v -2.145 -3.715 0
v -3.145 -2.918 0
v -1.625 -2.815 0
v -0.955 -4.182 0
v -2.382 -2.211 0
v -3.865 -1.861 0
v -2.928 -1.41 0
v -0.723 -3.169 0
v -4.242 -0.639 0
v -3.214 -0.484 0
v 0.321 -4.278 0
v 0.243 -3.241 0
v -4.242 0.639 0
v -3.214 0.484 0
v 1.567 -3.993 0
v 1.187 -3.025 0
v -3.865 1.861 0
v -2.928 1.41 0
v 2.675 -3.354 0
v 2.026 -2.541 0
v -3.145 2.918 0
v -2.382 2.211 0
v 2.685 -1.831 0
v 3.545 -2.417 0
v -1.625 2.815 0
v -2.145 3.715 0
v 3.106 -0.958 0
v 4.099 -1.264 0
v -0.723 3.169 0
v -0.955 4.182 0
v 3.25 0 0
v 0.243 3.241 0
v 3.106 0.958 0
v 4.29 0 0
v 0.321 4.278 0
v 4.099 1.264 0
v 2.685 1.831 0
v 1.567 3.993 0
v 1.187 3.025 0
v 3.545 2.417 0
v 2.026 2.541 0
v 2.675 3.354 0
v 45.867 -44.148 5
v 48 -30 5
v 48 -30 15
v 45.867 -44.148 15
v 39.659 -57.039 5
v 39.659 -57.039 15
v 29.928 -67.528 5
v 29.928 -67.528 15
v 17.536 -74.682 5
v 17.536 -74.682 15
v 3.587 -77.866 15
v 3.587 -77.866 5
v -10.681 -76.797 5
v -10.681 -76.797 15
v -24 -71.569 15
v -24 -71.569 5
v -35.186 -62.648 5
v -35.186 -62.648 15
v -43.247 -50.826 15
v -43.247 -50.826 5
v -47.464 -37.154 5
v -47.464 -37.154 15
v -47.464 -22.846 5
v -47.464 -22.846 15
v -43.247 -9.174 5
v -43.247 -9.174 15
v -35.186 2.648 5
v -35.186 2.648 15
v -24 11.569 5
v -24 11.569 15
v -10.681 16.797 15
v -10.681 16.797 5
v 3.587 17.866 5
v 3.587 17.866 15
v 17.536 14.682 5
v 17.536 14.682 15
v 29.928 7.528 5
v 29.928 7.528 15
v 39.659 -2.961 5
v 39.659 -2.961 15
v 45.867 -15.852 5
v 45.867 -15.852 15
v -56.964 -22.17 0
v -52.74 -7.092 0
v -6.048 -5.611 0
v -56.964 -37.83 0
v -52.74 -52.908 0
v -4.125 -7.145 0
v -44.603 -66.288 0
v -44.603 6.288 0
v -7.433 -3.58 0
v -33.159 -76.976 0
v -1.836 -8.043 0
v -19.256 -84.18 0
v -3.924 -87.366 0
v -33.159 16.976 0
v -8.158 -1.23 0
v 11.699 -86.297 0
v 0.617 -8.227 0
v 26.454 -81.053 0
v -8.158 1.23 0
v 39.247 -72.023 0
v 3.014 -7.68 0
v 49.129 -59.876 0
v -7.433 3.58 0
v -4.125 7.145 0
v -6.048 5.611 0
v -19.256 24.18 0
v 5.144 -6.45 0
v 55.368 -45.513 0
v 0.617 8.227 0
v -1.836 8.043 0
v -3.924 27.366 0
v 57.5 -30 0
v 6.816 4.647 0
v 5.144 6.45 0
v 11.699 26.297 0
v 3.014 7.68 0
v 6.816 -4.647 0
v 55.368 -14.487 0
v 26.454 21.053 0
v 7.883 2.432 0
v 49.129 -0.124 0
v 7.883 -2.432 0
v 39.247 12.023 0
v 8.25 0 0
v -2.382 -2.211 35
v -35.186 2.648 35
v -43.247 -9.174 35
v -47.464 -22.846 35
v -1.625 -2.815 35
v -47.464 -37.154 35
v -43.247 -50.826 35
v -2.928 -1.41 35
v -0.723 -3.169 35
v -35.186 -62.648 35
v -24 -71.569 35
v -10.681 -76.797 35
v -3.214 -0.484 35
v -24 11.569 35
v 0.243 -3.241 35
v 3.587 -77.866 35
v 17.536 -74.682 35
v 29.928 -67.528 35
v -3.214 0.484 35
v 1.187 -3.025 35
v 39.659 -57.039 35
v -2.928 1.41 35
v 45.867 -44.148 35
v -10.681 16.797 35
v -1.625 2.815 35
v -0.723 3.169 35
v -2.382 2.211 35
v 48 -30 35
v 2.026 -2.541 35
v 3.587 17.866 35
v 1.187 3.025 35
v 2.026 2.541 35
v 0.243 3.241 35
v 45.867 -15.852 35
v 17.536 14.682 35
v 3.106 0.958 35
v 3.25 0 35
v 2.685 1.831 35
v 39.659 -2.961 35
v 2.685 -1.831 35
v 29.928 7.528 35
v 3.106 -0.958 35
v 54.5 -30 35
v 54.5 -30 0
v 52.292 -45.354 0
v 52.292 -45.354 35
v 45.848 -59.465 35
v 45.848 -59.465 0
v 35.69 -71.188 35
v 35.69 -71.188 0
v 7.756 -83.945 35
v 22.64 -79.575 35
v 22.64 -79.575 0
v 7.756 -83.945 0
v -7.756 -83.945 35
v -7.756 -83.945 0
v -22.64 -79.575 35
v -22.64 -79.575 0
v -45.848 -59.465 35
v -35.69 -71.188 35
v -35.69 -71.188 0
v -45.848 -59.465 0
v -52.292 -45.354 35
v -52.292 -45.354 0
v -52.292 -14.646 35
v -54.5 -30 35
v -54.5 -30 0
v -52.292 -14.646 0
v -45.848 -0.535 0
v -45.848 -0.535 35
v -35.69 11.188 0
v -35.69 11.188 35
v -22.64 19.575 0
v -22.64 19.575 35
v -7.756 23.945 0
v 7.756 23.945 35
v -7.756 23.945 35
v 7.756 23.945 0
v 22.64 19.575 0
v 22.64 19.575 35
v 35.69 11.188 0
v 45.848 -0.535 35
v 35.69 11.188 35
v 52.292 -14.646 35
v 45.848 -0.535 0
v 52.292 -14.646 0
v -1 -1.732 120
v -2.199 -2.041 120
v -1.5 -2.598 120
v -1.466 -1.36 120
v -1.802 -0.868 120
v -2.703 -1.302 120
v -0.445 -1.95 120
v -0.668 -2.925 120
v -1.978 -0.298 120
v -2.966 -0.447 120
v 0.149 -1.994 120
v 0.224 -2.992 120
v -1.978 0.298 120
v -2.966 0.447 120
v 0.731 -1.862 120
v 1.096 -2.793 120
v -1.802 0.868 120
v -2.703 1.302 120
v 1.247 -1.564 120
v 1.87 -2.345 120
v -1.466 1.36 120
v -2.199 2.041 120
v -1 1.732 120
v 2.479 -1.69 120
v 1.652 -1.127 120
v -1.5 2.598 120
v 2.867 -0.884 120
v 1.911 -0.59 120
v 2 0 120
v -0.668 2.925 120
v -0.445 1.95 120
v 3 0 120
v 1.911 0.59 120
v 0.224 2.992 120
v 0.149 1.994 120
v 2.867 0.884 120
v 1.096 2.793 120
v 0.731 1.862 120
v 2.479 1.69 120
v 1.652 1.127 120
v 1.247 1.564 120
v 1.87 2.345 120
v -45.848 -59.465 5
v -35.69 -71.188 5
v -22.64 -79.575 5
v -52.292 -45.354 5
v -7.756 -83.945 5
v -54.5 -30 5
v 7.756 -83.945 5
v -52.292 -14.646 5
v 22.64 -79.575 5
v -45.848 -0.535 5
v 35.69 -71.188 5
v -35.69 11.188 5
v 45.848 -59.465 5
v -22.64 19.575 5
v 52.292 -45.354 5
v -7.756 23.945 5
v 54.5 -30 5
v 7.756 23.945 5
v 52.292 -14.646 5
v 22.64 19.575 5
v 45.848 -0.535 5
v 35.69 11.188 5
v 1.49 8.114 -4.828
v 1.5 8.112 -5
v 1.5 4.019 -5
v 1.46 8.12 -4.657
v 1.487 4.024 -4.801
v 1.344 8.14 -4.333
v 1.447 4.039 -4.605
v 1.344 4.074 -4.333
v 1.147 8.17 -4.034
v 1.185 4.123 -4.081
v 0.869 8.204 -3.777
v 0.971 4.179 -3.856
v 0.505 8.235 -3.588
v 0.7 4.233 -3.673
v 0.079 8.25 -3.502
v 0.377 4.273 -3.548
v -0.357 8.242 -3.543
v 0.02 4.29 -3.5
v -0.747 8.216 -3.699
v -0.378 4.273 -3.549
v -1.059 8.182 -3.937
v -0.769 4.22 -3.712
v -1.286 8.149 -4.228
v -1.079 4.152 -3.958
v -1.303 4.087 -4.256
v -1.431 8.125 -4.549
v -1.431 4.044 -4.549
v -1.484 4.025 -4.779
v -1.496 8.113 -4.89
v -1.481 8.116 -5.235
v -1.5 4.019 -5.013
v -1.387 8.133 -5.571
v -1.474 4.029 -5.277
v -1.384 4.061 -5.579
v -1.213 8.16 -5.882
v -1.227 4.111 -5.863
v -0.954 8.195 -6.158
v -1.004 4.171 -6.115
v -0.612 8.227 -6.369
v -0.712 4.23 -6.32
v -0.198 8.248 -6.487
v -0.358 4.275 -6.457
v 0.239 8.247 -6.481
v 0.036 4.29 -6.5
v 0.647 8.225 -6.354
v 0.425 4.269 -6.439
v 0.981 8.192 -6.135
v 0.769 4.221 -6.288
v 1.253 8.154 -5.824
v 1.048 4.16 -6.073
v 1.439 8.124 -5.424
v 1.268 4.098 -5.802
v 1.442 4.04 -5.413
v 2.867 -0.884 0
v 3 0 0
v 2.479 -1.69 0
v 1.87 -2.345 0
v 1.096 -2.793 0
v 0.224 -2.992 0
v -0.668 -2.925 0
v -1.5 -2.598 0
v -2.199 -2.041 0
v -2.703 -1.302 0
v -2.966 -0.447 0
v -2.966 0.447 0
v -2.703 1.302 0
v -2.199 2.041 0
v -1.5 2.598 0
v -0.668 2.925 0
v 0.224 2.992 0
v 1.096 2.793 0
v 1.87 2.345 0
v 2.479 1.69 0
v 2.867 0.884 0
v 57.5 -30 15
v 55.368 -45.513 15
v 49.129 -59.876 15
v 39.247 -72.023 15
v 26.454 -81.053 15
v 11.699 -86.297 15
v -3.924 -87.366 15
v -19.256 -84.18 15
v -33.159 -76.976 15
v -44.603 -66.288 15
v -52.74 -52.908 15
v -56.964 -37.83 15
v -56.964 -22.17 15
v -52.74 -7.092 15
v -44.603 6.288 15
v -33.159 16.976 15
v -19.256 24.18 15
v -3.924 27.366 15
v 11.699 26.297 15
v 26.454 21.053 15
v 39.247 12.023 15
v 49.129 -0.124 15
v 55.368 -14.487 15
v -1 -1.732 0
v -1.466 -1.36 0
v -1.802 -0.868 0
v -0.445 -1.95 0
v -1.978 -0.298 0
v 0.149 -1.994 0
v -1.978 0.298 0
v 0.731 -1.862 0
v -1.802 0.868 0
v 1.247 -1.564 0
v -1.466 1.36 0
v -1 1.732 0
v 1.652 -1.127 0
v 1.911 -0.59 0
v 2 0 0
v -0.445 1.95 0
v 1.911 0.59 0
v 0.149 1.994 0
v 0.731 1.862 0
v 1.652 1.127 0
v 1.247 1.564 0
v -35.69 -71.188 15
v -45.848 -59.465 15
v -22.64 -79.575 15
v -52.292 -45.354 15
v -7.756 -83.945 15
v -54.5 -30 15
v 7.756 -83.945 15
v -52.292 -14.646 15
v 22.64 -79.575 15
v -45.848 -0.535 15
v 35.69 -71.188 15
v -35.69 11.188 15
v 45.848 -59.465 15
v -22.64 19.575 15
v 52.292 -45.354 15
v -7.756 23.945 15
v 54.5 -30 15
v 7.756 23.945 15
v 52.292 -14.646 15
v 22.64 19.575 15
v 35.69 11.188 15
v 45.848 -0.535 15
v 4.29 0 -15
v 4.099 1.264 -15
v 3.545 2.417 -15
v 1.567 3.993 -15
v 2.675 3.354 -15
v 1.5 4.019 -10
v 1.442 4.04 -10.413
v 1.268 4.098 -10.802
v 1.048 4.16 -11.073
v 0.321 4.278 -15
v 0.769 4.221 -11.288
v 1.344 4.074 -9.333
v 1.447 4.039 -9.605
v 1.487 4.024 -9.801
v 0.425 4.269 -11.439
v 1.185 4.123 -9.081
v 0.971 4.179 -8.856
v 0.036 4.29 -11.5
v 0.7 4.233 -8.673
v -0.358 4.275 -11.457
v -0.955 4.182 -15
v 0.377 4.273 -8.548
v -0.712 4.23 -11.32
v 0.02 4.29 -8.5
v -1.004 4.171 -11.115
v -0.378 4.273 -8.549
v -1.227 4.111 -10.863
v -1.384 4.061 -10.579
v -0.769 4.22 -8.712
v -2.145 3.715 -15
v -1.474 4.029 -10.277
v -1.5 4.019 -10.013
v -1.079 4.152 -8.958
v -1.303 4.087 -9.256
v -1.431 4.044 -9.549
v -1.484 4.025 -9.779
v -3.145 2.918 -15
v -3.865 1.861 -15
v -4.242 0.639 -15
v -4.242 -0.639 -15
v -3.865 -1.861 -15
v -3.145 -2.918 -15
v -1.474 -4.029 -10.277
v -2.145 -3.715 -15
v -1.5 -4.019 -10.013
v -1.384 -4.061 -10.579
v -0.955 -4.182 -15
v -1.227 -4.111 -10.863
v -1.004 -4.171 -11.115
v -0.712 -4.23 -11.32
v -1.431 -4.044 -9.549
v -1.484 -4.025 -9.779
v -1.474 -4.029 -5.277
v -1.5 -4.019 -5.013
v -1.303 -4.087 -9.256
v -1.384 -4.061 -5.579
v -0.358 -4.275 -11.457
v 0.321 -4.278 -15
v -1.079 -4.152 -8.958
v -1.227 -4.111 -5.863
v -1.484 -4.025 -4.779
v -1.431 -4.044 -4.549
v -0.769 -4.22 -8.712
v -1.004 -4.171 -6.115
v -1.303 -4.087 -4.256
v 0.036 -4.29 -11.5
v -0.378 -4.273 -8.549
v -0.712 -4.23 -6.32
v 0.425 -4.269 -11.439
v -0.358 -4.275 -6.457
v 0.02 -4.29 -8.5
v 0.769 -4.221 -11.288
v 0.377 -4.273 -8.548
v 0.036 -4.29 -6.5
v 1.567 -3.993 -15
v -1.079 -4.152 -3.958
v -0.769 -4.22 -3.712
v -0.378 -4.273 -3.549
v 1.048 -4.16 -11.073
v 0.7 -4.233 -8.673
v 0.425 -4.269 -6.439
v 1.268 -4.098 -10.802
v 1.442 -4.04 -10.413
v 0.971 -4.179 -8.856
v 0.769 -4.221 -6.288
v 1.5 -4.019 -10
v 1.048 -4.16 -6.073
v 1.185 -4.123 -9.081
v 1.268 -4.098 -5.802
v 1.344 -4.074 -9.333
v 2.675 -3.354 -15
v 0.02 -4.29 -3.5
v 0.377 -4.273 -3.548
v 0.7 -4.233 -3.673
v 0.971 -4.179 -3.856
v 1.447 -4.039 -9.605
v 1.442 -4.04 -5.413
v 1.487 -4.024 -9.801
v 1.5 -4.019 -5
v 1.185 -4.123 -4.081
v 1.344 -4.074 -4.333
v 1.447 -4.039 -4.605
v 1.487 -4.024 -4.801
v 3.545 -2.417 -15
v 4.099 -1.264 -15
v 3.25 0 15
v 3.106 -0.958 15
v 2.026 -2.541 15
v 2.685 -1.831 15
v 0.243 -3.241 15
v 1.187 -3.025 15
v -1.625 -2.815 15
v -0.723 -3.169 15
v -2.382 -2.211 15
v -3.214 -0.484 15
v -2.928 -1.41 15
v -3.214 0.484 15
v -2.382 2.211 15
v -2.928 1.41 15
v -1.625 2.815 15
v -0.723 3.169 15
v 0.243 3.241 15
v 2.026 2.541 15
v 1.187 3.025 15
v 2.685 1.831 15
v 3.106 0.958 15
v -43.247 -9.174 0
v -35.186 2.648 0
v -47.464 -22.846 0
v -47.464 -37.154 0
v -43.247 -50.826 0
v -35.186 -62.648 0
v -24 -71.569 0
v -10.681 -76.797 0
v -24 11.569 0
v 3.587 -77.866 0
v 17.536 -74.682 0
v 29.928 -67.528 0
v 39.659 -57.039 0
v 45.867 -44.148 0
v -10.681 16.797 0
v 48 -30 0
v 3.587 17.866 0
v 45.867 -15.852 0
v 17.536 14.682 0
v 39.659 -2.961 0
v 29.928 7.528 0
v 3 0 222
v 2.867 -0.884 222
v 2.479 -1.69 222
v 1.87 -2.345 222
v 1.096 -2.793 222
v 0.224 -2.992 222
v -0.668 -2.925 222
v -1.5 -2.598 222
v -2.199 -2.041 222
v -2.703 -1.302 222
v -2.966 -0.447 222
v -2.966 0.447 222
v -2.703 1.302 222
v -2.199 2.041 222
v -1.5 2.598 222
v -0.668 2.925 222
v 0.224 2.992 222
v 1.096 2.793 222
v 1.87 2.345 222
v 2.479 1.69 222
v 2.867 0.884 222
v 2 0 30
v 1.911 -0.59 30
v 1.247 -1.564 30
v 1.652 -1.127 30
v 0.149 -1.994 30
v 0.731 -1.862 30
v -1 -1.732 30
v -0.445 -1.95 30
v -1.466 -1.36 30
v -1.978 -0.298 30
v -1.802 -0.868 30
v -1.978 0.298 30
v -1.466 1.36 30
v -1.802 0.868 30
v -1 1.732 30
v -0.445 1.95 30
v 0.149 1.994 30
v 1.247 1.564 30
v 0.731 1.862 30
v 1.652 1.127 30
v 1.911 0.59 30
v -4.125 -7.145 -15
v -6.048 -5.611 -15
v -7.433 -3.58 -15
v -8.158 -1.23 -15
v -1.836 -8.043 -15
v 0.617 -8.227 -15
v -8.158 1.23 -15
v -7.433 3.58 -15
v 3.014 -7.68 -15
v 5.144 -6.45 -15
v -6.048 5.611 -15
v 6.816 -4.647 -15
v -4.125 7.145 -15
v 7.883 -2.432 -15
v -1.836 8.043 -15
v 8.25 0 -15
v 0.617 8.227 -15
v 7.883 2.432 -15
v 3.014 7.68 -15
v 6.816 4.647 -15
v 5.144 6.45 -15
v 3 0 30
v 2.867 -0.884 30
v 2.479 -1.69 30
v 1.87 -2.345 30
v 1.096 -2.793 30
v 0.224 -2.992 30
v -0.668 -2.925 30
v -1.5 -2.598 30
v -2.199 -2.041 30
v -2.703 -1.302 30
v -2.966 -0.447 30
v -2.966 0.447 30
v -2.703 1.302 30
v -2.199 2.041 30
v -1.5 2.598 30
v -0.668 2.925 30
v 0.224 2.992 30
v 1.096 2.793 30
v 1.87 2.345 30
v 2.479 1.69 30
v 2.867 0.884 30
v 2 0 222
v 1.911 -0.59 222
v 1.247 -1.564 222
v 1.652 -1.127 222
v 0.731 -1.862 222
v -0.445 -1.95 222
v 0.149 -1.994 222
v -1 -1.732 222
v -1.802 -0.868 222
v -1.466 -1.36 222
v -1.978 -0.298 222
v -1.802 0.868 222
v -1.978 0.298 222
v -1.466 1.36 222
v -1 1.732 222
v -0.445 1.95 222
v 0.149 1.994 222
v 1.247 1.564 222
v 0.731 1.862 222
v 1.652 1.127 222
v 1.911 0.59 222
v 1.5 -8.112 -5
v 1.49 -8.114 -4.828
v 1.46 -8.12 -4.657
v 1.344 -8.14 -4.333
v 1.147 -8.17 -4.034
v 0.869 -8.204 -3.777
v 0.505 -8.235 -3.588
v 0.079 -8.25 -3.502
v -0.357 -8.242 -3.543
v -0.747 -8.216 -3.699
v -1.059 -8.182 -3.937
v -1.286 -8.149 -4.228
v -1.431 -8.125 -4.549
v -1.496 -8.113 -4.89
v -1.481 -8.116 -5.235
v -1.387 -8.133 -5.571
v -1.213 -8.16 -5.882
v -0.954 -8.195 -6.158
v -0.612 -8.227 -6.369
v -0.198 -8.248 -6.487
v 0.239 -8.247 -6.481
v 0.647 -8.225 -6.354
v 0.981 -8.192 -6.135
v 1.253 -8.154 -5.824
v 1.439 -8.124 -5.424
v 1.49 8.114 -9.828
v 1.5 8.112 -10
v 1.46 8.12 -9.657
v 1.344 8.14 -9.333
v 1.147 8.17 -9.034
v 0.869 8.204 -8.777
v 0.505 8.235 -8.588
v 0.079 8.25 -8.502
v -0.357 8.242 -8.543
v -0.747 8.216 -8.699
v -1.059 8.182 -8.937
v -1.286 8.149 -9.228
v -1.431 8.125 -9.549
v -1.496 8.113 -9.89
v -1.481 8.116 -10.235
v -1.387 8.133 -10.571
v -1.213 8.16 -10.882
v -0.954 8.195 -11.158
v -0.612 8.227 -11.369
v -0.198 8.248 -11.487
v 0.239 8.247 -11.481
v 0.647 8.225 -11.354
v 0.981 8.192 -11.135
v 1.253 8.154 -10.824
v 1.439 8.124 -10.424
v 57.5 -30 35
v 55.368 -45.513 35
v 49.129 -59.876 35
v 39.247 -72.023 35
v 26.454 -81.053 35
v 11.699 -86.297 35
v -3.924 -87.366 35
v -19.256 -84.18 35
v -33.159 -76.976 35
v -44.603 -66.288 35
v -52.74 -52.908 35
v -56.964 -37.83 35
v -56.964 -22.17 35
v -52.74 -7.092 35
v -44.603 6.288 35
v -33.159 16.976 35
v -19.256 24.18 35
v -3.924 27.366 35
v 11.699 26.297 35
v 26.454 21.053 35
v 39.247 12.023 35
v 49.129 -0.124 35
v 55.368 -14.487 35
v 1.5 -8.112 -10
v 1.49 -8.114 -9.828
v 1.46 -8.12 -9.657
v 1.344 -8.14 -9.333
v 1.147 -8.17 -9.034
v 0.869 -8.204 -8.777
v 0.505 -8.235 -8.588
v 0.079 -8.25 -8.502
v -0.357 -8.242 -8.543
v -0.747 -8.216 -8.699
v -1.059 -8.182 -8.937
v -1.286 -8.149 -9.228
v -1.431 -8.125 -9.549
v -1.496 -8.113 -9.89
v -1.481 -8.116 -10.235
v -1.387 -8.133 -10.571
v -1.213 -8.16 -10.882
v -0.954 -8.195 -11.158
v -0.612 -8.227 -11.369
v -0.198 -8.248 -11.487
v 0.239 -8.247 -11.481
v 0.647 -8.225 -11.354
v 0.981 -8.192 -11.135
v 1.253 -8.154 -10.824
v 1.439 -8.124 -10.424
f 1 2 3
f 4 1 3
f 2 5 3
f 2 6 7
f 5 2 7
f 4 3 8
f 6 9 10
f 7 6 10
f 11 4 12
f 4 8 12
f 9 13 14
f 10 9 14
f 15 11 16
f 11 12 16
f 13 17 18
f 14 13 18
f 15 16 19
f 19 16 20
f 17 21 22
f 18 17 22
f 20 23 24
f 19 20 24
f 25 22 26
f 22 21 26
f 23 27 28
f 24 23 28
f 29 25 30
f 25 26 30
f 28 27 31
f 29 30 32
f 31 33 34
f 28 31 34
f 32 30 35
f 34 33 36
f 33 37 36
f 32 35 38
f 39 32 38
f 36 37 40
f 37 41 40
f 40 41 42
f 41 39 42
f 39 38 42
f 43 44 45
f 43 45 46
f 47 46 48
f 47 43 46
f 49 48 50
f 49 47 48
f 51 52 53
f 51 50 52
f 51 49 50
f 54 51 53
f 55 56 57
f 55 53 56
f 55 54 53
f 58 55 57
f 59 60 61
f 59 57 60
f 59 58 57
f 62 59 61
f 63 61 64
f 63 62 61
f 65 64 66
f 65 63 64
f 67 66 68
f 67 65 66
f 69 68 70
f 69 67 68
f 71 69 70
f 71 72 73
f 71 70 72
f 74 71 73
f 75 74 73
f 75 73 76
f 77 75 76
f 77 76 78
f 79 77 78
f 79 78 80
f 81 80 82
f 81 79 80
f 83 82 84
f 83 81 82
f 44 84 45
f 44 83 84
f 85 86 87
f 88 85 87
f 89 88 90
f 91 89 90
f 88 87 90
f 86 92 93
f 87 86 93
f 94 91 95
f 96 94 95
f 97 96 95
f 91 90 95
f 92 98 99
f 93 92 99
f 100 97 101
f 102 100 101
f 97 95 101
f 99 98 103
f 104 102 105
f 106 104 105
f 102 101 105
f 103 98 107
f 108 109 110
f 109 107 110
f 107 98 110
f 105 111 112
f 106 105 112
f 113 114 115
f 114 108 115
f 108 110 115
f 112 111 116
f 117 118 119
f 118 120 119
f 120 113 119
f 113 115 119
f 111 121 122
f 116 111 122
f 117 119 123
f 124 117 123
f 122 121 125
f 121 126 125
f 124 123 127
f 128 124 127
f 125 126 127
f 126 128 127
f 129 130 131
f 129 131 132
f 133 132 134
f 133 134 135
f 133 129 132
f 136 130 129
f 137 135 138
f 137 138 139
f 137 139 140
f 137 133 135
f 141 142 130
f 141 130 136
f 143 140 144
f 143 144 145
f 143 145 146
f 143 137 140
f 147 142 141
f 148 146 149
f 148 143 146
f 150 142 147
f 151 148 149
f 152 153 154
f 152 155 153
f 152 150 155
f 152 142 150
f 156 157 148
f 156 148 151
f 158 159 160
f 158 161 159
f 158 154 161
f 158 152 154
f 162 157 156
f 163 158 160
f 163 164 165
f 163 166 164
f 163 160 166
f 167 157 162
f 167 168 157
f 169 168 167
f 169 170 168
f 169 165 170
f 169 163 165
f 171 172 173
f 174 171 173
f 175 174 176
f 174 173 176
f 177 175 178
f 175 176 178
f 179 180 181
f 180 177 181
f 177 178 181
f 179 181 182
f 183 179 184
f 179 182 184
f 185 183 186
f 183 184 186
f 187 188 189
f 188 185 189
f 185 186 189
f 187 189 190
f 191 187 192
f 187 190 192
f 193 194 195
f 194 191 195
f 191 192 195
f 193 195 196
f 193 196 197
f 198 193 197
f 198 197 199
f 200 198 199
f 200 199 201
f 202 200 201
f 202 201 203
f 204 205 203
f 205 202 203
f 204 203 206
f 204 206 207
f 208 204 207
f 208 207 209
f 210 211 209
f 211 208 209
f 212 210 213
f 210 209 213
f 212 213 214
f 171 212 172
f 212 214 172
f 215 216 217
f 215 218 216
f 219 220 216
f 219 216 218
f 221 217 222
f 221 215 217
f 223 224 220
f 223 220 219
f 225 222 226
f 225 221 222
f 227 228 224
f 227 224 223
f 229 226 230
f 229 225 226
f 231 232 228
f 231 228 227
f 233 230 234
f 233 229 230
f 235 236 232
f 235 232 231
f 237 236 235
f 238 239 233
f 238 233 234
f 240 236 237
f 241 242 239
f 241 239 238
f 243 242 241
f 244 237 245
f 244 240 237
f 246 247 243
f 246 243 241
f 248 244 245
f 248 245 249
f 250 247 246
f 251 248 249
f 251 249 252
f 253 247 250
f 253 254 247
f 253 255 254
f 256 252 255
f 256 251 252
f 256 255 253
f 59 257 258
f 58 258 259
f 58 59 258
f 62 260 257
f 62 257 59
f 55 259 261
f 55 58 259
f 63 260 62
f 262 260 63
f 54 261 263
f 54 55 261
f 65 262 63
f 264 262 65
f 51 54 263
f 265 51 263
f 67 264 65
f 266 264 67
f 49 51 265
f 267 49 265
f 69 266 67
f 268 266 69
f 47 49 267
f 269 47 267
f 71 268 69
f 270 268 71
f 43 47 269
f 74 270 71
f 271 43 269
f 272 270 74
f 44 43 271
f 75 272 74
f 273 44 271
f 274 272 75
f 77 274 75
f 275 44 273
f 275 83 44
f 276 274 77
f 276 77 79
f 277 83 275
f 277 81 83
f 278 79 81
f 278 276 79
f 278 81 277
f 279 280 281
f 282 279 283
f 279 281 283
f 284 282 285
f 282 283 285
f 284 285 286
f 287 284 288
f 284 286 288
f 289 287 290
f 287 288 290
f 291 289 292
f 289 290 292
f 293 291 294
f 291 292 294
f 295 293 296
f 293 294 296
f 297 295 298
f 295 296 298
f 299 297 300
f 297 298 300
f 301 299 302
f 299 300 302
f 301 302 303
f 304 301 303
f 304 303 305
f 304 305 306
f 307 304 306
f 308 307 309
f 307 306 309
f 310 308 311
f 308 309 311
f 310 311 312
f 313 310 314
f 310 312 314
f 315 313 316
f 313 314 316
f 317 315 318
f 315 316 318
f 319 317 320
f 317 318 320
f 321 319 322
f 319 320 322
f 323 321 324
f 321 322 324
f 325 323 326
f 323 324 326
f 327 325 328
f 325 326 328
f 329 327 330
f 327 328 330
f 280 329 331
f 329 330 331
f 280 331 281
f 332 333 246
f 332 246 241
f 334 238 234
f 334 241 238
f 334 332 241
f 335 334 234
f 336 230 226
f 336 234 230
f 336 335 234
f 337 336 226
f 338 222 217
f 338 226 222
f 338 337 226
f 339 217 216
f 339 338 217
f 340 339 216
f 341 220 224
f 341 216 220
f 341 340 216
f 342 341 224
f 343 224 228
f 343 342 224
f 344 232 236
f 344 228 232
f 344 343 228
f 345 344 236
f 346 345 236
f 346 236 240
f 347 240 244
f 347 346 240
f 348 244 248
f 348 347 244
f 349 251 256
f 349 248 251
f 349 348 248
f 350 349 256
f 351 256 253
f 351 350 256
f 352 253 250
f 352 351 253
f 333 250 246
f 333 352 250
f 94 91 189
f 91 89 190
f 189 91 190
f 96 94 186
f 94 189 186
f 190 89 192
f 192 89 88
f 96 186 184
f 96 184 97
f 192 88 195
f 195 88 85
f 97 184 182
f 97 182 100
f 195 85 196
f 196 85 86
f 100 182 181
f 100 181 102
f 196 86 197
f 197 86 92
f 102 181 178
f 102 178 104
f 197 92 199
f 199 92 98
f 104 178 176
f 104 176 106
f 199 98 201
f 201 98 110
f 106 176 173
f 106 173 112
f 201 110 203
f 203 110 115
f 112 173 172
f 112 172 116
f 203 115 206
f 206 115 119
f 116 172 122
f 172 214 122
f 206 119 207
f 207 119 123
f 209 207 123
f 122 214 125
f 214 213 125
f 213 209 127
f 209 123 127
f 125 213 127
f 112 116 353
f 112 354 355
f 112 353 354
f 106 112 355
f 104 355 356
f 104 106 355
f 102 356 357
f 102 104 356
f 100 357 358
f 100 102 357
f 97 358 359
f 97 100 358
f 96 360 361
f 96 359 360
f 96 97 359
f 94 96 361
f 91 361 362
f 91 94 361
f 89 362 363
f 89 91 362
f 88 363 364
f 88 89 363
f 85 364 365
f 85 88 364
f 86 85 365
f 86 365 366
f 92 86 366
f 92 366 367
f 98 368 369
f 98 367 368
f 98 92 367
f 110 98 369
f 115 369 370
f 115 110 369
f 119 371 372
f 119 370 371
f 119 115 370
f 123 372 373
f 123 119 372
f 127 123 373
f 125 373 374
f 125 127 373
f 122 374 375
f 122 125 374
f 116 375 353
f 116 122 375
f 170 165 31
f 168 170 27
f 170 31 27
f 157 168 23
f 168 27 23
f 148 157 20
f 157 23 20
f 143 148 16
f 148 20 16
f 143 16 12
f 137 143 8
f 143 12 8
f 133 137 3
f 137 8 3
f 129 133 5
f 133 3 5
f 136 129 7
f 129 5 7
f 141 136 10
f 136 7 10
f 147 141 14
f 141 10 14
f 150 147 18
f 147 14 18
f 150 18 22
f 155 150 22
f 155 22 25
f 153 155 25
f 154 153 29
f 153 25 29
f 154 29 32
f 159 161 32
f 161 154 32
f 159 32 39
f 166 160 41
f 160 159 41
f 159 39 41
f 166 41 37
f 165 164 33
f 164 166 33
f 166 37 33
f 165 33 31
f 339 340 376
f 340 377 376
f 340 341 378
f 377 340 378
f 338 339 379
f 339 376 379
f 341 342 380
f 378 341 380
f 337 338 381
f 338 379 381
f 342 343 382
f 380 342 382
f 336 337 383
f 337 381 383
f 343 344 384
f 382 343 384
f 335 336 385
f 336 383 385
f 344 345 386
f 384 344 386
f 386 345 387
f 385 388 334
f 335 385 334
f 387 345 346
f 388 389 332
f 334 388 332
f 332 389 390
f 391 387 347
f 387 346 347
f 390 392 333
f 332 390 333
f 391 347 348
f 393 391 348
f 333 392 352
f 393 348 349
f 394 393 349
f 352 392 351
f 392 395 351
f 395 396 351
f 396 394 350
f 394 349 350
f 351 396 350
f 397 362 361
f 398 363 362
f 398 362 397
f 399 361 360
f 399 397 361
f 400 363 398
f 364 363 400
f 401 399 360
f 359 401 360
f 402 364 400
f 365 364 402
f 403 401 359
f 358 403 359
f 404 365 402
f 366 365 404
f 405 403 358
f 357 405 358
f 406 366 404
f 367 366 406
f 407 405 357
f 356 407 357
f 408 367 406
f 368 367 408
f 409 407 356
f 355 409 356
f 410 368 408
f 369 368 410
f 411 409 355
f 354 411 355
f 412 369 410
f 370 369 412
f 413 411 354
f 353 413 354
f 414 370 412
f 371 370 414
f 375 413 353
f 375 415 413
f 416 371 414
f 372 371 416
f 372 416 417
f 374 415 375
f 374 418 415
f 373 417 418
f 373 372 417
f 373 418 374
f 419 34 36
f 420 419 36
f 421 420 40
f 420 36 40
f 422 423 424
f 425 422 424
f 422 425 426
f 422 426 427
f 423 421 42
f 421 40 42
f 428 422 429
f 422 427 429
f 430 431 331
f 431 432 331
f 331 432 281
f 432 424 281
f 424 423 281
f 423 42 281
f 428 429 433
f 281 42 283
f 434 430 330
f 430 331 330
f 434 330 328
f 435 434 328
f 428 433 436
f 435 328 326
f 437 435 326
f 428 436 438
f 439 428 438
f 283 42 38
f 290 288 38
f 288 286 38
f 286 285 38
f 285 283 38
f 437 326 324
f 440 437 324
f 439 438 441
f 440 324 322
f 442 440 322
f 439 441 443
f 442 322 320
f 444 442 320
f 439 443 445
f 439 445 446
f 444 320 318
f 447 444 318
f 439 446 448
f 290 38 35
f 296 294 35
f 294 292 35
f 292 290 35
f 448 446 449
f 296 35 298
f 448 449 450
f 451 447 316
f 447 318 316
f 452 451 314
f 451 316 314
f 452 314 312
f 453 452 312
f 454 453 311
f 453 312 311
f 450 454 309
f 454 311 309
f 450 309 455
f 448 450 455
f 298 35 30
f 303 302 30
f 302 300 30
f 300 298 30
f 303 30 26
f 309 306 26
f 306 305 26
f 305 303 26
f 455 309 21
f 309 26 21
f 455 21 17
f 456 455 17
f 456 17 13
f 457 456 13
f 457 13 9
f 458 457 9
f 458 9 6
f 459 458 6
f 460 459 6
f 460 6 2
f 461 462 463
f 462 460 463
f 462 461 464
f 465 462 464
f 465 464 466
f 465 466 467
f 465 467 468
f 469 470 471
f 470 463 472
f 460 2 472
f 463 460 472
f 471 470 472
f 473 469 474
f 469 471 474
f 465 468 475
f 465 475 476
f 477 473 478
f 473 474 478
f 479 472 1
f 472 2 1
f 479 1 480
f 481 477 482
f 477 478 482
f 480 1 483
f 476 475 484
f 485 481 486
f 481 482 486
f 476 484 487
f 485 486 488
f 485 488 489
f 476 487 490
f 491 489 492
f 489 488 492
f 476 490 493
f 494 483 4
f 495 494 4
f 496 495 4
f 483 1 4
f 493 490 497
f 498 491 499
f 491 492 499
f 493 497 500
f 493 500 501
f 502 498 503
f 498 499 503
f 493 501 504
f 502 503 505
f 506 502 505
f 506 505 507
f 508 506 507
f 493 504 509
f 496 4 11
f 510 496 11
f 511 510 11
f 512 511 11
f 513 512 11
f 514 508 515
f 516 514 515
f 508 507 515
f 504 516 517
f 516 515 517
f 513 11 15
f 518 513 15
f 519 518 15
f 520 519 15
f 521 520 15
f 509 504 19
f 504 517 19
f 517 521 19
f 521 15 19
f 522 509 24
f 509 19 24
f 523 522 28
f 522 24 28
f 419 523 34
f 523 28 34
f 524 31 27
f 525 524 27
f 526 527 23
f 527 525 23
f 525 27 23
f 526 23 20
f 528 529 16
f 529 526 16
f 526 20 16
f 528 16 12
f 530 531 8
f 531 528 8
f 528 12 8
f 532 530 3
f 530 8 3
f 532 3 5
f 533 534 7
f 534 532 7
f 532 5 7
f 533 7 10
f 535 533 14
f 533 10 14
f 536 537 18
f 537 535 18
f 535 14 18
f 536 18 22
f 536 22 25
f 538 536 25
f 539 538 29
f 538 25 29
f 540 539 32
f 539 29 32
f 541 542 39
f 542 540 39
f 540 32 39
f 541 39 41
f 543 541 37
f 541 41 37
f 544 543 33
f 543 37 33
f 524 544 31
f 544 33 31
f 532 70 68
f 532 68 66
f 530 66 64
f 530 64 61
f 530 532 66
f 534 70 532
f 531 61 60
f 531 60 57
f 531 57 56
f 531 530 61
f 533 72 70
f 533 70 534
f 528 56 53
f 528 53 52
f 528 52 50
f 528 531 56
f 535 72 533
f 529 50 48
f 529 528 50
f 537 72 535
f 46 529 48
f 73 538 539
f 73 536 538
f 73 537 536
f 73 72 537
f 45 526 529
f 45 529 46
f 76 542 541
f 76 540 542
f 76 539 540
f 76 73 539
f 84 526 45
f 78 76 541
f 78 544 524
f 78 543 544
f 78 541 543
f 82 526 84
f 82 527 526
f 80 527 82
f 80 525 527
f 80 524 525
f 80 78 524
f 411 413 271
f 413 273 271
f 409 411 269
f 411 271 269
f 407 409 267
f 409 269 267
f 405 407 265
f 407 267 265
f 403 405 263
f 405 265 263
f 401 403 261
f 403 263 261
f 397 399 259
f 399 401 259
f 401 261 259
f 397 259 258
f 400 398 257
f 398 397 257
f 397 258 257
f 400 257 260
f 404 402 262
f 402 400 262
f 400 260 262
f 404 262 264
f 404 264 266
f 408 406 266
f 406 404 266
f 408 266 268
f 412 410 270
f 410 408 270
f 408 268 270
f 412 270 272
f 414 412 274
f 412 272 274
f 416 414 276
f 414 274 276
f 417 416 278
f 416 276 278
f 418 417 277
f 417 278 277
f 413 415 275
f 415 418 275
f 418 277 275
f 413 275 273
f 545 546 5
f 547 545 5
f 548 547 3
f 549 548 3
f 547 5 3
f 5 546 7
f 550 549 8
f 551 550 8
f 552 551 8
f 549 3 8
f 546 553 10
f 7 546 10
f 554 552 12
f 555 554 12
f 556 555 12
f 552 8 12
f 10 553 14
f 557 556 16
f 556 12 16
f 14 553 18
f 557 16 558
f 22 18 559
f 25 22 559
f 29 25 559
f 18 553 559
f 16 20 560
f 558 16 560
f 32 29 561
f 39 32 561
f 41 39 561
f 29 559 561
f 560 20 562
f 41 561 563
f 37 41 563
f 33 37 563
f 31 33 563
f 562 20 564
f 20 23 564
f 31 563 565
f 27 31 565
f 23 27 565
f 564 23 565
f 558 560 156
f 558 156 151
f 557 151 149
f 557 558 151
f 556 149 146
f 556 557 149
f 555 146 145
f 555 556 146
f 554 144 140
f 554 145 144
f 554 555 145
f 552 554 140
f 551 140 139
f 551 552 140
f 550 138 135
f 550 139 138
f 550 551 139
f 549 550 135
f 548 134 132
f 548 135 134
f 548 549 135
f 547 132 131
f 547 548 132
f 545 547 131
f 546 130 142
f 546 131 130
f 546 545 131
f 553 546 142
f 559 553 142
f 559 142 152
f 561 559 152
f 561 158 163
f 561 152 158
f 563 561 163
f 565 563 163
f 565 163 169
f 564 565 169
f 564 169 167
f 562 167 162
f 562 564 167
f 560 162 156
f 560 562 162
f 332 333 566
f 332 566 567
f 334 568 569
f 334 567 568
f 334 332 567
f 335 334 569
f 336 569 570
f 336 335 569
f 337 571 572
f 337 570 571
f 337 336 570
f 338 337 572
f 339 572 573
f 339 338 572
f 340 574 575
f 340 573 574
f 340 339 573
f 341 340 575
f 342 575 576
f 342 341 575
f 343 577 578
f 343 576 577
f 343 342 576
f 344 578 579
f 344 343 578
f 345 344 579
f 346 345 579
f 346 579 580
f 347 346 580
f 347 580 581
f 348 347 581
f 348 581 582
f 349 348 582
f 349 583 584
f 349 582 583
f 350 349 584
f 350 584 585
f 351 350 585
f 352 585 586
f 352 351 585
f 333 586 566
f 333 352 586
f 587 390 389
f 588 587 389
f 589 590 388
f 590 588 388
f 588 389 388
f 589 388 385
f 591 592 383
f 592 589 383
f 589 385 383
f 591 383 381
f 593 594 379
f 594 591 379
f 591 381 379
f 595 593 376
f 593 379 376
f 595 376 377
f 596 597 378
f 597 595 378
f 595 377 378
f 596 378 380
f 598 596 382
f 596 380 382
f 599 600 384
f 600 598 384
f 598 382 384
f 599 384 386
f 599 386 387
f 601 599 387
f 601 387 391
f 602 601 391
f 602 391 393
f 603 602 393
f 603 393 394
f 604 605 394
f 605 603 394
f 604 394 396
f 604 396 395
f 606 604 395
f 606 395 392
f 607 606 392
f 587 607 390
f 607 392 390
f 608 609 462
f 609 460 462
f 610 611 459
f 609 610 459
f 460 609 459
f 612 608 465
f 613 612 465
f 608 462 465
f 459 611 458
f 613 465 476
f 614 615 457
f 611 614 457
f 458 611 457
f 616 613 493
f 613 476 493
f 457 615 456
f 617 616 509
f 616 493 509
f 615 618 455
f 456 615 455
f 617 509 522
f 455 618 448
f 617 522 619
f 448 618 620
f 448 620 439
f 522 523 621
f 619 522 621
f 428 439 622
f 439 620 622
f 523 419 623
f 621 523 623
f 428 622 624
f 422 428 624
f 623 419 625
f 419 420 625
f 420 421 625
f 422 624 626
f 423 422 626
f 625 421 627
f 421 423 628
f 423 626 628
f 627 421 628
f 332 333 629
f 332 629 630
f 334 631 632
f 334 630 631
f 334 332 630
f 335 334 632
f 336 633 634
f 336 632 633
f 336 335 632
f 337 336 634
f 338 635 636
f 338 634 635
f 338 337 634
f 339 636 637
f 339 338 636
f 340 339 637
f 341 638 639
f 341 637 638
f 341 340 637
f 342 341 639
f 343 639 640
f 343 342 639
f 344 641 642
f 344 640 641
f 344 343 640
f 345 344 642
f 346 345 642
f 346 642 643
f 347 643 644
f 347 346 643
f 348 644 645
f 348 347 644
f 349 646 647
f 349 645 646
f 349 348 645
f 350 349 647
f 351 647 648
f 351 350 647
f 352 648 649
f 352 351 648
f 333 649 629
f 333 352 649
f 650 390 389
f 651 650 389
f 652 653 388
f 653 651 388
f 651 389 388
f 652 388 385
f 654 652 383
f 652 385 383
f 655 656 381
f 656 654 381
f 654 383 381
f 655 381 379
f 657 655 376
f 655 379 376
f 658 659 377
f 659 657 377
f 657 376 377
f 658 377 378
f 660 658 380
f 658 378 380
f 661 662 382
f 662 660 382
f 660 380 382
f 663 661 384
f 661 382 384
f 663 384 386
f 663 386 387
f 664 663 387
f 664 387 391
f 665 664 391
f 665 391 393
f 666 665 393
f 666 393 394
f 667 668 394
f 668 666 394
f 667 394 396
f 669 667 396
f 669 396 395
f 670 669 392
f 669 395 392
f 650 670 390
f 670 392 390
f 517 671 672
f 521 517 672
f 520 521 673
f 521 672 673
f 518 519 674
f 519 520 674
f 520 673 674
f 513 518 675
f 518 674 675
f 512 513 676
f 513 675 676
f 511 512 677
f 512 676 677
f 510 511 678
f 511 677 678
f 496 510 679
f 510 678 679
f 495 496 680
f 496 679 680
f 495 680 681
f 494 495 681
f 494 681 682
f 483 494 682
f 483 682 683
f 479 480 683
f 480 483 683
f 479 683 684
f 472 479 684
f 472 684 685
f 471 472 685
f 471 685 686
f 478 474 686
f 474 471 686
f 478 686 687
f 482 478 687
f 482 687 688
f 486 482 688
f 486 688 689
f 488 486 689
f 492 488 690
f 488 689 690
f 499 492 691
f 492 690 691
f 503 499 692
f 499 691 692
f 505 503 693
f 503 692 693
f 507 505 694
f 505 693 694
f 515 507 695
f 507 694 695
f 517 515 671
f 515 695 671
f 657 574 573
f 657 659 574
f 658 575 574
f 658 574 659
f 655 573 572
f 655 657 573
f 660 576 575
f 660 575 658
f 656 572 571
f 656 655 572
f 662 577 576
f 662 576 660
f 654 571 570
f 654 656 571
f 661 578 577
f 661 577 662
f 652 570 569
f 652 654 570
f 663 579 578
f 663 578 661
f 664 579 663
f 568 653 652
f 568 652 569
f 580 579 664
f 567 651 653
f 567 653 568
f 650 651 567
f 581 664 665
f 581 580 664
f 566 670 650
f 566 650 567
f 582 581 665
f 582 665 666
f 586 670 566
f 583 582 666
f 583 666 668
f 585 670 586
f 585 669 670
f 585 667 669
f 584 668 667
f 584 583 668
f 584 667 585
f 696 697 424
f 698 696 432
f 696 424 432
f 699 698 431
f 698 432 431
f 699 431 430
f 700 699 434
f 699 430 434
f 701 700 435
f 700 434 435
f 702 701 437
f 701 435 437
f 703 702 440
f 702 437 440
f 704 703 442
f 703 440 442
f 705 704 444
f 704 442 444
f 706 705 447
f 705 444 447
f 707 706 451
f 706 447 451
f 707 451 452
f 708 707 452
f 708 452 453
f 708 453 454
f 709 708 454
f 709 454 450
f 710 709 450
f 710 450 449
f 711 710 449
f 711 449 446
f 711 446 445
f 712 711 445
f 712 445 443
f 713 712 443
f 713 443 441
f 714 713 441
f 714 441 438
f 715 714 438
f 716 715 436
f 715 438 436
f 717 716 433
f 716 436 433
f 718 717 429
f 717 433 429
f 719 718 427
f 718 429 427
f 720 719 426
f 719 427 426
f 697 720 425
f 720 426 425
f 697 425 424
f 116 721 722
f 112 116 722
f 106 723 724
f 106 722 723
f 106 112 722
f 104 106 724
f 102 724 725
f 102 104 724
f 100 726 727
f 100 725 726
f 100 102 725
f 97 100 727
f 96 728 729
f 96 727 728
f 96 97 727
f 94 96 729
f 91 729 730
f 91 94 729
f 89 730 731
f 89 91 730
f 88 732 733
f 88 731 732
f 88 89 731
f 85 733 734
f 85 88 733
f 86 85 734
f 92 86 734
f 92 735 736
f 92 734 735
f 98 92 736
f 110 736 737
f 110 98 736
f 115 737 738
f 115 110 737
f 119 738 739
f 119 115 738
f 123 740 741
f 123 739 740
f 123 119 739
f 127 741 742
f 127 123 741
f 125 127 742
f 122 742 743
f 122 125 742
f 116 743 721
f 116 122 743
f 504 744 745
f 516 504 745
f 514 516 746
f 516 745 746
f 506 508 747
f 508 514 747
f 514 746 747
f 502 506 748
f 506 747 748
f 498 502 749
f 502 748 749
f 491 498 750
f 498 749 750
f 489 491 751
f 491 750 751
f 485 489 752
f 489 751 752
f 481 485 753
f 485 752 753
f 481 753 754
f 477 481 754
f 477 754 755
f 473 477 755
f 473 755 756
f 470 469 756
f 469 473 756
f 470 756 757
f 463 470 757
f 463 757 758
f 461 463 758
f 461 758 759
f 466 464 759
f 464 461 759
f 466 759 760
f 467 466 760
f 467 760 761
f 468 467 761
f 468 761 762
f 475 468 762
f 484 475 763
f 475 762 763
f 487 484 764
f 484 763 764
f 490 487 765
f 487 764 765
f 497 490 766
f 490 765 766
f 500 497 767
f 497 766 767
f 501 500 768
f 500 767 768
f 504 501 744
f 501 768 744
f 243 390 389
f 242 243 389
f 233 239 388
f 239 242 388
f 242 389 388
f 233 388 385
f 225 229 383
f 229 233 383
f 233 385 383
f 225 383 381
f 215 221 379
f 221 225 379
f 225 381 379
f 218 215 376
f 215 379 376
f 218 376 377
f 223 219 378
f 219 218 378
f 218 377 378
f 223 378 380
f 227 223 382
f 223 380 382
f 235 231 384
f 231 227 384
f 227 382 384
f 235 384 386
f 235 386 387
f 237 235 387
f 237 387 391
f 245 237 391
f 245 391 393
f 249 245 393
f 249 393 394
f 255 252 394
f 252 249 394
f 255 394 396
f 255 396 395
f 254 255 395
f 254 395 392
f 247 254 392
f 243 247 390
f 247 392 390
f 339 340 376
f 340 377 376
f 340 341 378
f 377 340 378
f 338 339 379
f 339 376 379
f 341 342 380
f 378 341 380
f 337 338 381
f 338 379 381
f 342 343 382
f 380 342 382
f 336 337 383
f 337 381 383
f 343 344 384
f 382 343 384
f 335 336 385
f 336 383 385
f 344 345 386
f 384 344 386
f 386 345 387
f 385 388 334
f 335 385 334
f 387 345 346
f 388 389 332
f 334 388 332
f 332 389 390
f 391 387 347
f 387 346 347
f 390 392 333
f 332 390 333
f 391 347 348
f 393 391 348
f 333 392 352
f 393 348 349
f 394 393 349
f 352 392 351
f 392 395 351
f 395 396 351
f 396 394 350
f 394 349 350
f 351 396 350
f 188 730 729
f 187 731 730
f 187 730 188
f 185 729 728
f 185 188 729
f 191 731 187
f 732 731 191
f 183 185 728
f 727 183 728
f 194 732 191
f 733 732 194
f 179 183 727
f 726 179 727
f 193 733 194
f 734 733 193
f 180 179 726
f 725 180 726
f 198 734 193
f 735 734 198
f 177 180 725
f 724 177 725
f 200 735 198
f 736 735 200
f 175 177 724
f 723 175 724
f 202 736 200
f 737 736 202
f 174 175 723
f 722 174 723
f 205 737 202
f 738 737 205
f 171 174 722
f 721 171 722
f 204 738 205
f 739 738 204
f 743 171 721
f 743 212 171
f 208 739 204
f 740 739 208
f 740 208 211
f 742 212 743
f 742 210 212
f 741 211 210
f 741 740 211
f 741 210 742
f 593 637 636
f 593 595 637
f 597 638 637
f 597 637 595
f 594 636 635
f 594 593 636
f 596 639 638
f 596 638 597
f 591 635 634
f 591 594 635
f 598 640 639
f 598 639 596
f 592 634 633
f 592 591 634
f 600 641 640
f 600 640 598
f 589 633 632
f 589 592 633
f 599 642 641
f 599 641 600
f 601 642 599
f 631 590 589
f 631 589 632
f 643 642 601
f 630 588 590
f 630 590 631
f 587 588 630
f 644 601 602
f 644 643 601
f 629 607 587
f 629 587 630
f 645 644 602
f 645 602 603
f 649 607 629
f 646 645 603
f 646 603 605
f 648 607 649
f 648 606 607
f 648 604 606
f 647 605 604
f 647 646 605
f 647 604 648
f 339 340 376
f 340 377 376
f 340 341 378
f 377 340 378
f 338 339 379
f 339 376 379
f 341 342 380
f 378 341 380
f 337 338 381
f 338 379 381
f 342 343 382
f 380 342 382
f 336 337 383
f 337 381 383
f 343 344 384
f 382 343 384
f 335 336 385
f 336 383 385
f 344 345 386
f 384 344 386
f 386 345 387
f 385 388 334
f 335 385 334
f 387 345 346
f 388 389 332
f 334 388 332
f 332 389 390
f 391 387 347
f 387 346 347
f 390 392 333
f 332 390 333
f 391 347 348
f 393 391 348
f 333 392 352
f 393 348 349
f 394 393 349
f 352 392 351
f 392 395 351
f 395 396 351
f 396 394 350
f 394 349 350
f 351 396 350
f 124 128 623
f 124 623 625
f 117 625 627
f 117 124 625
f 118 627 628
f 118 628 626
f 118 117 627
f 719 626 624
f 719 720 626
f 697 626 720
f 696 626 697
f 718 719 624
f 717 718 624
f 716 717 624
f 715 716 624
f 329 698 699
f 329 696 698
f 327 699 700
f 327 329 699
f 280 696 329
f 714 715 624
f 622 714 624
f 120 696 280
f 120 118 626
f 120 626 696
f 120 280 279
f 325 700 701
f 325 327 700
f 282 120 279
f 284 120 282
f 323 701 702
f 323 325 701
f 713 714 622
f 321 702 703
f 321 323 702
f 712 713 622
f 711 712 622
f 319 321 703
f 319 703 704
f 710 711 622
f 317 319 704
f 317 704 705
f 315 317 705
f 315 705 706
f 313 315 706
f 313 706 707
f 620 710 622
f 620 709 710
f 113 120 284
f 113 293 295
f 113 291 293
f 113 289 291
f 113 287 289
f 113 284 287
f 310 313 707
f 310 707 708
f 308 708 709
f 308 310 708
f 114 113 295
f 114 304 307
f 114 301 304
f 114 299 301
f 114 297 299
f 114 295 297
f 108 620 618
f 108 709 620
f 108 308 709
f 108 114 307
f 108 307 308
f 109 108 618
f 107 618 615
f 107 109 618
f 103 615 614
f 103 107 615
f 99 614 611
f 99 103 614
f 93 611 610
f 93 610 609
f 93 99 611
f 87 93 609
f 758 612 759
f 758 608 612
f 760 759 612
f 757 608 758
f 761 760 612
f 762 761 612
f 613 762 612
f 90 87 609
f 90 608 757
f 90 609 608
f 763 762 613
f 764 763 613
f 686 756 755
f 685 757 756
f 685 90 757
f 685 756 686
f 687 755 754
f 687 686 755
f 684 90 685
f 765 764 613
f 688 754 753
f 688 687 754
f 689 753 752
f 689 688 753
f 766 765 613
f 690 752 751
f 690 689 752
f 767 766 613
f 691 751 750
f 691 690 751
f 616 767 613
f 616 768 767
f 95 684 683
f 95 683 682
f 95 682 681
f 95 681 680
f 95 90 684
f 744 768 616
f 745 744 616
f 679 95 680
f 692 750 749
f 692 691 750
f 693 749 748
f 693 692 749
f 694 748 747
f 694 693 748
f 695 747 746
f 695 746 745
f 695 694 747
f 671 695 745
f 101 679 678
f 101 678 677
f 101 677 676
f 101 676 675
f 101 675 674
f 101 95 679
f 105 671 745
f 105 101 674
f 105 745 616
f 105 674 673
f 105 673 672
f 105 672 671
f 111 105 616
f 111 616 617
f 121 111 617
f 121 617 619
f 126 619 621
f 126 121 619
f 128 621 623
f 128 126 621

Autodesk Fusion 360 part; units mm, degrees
sketch "Aluminum 4mm-6mm" plane through (0, 0, 0) normal (0, 0, 1) x (1, 0, 0)
  circle A0 centre (0, 0) radius 2
  circle A1 centre (0, 0) radius 3
  dimension "d1" = 4
  dimension "d2" = 6
extrude "Extrude1" add sketch "Aluminum 4mm-6mm" along normal blind 190 makes body 1
copy_body "Body->Comp1" bodies 1 removing the originals makes body 2 in component "190mm aluminum 4-6 bar"
extrude "Extrude2" add sketch "Aluminum 4mm-6mm" along normal blind 250 separate body makes body 3
copy_body "Body->Comp2" bodies 3 removing the originals makes body 4 in component "250mm aluminum 4-6 bar"
extrude "Extrude3" add sketch "Aluminum 4mm-6mm" along normal blind 120 separate body makes body 5
copy_body "Body->Comp3" bodies 5 removing the originals makes body 6 in component "120mm aluminum 4-6 bar"
extrude "Extrude4" add sketch "Aluminum 4mm-6mm" along normal blind 222 separate body makes body 7
copy_body "Body->Comp4" bodies 7 removing the originals makes body 8 in component "220mm aluminum 4-6 bar"
extrude "Extrude5" add sketch "Aluminum 4mm-6mm" along normal blind 30 separate body makes body 9
copy_body "Body->Comp5" bodies 9 removing the originals makes body 10 in component "30mm aluminum 4-6 bar"
component "190mm aluminum 4-6 bar" placed x (1, 0, 0) y (0, 1, 0) z (0, 0, 1) at (0, 0, 0)
component "250mm aluminum 4-6 bar" placed x (1, 0, 0) y (0, 1, 0) z (0, 0, 1) at (0, 0, 0)
component "120mm aluminum 4-6 bar" placed x (1, 0, 0) y (0, 1, 0) z (0, 0, 1) at (0, 0, 0)
component "220mm aluminum 4-6 bar" placed x (1, 0, 0) y (0, 1, 0) z (0, 0, 1) at (0, 0, 0)
component "30mm aluminum 4-6 bar" placed x (1, 0, 0) y (0, 1, 0) z (0, 0, 1) at (0, 0, 0)
equation "d13 = 180 mm + ( ( 5 + 5 + 3 + 8 ) * 2 ) * 1 mm"

Autodesk Fusion 360 part; units mm, degrees
sketch "Sketch1" plane through (0, 0, 0) normal (0, 0, 1) x (1, 0, 0)
  line L0 (90, -40) -> (-90, -40)
  line L1 (-90, -40) -> (-90, 40)
  line L2 (-90, 40) -> (90, 40)
  line L3 (90, 40) -> (90, -40)
  line L4 (90, -40) -> (-90, 40) construction
  line L5 (-90, -40) -> (90, 40) construction
  line L6 (-85, -35) -> (85, 35) construction
  line L7 (85, -35) -> (-85, 35) construction
  circle A0 centre (-85, 35) radius 1.5
  circle A1 centre (-85, -35) radius 1.5
  circle A2 centre (85, 35) radius 1.5
  circle A3 centre (85, -35) radius 1.5
  dimension "d1" = 180
  dimension "d2" = 80
  dimension "d3" = 170
  dimension "d4" = 70
  dimension "d5" = 3
  dimension "d6" = 3
  dimension "d7" = 3
  dimension "d8" = 3
extrude "Extrude1" add sketch "Sketch1" along normal blind 5 makes body 1
copy_body "Body->Comp1" bodies 1 removing the originals makes body 2 in component "Simple flat bucket"
component "Simple flat bucket" placed x (1, 0, 0) y (0, 1, 0) z (0, 0, 1) at (0, 0, 0)

Autodesk Fusion 360 part; units mm, degrees
sketch "Sketch1" plane through (0, 0, 0) normal (0, 0, 1) x (1, 0, 0)
  circle A0 centre (0, 0) radius 6
  circle A1 centre (0, 0) radius 3
  dimension "d1" = 12
  dimension "d2" = 6
extrude "Extrude1" add sketch "Sketch1" along normal blind 35 makes body 1
sketch "Sketch2" plane through (0, 0, 35) normal (0, 0, 1) x (-1, 0, 0)
  circle A0 centre (0, 0) radius 5.75
  circle A1 centre (0, 0) radius 6
  dimension "d5" = 11.5
  dimension "d6" = 12
extrude "Extrude2" add sketch "Sketch2" against normal blind 1.1 from surface at -4 separate body makes body 2
ref_plane "WorkPlane1" through (0, 0, 17.5) normal (0, 0, -1) x (-1, 0, 0)
mirror "Mirror1" about plane through (0, 0, 17.5) normal (0, 0, -1) of bodies 2 makes body 3
combine "Combine1" operation cut target body 1 tool bodies 2 3
copy_body "Body->Comp1" bodies 1 removing the originals makes body 4 in component "LM6L"
component "LM6L" placed x (1, 0, 0) y (0, 1, 0) z (0, 0, 1) at (0, 0, 0)
equation "d7 = ( -( 35 - 27 ) / 2 ) * 1 mm"

Autodesk Fusion 360 part; units mm, degrees
sketch "Sketch1" plane through (0, 0, 0) normal (0, 0, 1) x (1, 0, 0)
  line L0 (0, 0) -> (0, -30)
  circle A0 centre (0, -30) radius 54.5
  circle A1 centre (0, -30) radius 48
  circle A2 centre (0, 0) radius 3.25
  circle A3 centre (0, -30) radius 57.5
  dimension "d1" = 30
  dimension "d2" = 109
  dimension "d3" = 96
  dimension "d4" = 6.5
  dimension "d5" = 115
extrude "Extrude1" add sketch "Sketch1" along normal blind 5 contours A0 | A1 | A3 makes body 1
extrude "Extrude2" add sketch "Sketch1" along normal blind 10 from surface at 5 bodies 1
sketch "Sketch2" plane through (0, 0, 0) normal (0, 0, 1) x (1, 0, 0)
  circle A0 centre (0, 0) radius 8.25
  circle A1 centre (0, 0) radius 4.29
  dimension "d11" = 16.5
extrude "Extrude3" add sketch "Sketch2" against normal blind 15 bodies 1
sketch "Sketch4" plane through (0, 0, 0) normal (0, 1, 0) x (1, 0, 0)
  line L0 (-4.29, 15) -> (4.29, 15)
  line L1 (0, 0) -> (0, 15)
  line L2 (-8.25, 0) -> (8.25, 0)
  line L3 (0, 0) -> (0, 5)
  line L4 (0, 15) -> (0, 14)
  line L5 (0, 15) -> (0, 10)
  circle A0 centre (0, 5) radius 1.5
  circle A1 centre (0, 10) radius 1.5
  dimension "d14" = 5
  dimension "d15" = 5
  dimension "d16" = 3
  dimension "d17" = 3
extrude "Extrude4" cut sketch "Sketch4" along normal mid plane 20 bodies 1
copy_body "Body->Comp1" bodies 1 removing the originals makes body 2 in component "Simple Cam, 30mm "
component "Simple Cam, 30mm " placed x (1, 0, 0) y (0, 1, 0) z (0, 0, 1) at (0, 0, 0)
equation "d1 = ( 102.5 / 2 ) * 1 mm - 21.25 mm"
equation "d2 = 102.5 mm + 6.5 mm"
equation "d3 = 102.5 mm - 6.5 mm"
equation "d5 = 102.5 mm + 6.5 mm + ( 3 * 2 ) * 1 mm"
equation "d11 = 6.5 mm + ( 5 * 2 ) * 1 mm"
